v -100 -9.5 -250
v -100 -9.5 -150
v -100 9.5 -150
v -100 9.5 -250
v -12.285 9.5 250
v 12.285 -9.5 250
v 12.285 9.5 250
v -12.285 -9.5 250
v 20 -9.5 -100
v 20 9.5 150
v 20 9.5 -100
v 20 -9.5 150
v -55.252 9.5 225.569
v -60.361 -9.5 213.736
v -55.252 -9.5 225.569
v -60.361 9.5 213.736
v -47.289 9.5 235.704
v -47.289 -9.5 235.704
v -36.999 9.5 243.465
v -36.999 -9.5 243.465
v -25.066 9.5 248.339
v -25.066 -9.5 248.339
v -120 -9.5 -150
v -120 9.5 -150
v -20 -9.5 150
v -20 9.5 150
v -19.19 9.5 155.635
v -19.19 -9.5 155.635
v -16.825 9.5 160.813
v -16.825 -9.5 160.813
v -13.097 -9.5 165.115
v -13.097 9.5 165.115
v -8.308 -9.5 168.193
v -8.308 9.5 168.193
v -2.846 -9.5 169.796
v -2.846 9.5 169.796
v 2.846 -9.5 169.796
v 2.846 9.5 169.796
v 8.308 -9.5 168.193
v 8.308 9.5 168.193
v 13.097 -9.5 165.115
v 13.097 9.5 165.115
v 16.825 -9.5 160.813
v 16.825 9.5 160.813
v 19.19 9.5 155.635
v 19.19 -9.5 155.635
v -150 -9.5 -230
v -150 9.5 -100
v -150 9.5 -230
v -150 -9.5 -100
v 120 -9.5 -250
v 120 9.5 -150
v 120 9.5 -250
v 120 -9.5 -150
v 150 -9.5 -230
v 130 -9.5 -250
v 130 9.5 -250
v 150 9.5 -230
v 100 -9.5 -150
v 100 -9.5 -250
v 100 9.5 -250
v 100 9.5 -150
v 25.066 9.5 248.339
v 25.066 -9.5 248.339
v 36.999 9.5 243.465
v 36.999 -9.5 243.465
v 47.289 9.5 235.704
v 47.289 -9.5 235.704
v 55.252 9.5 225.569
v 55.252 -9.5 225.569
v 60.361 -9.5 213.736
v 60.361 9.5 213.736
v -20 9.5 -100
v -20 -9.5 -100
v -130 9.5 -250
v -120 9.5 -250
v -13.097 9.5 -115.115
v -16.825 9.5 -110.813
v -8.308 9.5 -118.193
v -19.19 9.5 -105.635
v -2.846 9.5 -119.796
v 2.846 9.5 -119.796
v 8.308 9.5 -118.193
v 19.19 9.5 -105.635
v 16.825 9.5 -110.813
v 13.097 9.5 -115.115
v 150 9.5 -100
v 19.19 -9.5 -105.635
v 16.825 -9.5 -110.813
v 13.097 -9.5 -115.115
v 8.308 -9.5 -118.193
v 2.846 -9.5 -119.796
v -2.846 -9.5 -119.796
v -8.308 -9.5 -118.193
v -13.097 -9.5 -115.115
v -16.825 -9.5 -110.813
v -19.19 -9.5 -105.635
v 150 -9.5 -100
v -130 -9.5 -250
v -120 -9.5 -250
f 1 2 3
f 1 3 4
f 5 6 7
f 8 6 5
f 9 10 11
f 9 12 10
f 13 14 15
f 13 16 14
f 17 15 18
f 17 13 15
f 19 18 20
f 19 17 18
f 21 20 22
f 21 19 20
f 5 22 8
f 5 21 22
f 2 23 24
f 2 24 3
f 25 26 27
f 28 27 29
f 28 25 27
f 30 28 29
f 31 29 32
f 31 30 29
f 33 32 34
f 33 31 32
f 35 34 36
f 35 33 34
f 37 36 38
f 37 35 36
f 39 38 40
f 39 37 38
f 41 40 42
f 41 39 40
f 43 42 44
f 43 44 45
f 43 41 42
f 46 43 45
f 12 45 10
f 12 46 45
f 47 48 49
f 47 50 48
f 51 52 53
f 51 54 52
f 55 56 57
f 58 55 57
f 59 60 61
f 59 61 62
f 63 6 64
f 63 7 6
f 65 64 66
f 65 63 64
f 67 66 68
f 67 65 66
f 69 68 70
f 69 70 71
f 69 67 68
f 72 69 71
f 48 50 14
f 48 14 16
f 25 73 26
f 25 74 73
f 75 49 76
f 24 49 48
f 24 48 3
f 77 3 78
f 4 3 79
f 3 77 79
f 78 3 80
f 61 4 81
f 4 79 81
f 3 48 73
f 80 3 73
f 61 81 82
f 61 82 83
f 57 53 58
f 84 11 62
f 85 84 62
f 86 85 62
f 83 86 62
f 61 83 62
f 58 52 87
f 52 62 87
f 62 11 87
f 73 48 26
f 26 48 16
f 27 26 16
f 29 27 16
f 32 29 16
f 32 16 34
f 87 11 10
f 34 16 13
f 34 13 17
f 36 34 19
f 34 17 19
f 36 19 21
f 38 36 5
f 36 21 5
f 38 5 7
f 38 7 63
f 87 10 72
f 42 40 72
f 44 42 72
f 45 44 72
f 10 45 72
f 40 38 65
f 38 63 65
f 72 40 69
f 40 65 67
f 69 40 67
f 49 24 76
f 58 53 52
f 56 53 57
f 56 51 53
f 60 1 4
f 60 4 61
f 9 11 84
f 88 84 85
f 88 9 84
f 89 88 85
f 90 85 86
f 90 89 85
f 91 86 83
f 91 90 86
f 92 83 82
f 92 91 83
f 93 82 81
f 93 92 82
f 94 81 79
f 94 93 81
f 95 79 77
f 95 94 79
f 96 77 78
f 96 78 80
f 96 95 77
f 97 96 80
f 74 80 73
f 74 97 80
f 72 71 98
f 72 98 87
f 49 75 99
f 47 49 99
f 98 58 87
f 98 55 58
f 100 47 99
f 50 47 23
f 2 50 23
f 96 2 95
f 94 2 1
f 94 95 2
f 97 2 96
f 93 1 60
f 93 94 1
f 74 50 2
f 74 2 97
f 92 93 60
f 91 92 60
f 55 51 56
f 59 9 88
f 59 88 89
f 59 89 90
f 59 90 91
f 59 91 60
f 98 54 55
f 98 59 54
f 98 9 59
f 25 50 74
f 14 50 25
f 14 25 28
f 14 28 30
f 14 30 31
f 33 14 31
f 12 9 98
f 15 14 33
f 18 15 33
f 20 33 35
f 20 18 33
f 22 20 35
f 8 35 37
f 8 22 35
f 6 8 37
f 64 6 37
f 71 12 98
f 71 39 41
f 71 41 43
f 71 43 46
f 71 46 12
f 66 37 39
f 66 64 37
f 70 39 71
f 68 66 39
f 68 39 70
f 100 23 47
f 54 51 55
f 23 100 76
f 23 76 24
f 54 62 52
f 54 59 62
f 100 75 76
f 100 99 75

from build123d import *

# Parameters (mm, degrees)
F1_DEPTH = 9.5
F2_SIZE2 = 350
F2_SIZE  = 100
F3_R     = 50
F4_SIZE  = 20


with BuildPart() as f1:
    # F0 (on Front) → F1 (new body, symmetric)
    with BuildSketch(Plane.XZ):
        Polygon((0, 250), (-150, 250), (-150, -250), (-120, -250), (-120, -150), (-100, -150), (-100, -250), (0, -250), (100, -250), (100, -150), (120, -150), (120, -250), (150, -250), (150, 250), align=None)
        with BuildLine():
            ThreePointArc((-20, 150), (0, 170), (20, 150))
            Line((20, 150), (20, -100))
            ThreePointArc((20, -100), (0, -120), (-20, -100))
            Line((-20, -100), (-20, 150))
        make_face(mode=Mode.SUBTRACT)
    extrude(amount=F1_DEPTH, both=True)

    # F2
    f2_edges = [f1.edges().sort_by_distance(p)[0] for p in [
        (150, 0, 250),
        (-150, 0, 250),
    ]]
    f2_side = f1.faces().sort_by_distance((0, 0, 250))[0]
    chamfer(f2_edges, length=F2_SIZE, length2=F2_SIZE2, reference=f2_side)

    # F3
    f3_edges = [f1.edges().sort_by_distance(p)[0] for p in [
        (-50, 0, 250),
        (50, 0, 250),
    ]]
    fillet(f3_edges, radius=F3_R)

    # F4
    f4_edges = [f1.edges().sort_by_distance(p)[0] for p in [
        (-150, 0, -250),
        (150, 0, -250),
    ]]
    chamfer(f4_edges, length=F4_SIZE)


solid = f1.part
